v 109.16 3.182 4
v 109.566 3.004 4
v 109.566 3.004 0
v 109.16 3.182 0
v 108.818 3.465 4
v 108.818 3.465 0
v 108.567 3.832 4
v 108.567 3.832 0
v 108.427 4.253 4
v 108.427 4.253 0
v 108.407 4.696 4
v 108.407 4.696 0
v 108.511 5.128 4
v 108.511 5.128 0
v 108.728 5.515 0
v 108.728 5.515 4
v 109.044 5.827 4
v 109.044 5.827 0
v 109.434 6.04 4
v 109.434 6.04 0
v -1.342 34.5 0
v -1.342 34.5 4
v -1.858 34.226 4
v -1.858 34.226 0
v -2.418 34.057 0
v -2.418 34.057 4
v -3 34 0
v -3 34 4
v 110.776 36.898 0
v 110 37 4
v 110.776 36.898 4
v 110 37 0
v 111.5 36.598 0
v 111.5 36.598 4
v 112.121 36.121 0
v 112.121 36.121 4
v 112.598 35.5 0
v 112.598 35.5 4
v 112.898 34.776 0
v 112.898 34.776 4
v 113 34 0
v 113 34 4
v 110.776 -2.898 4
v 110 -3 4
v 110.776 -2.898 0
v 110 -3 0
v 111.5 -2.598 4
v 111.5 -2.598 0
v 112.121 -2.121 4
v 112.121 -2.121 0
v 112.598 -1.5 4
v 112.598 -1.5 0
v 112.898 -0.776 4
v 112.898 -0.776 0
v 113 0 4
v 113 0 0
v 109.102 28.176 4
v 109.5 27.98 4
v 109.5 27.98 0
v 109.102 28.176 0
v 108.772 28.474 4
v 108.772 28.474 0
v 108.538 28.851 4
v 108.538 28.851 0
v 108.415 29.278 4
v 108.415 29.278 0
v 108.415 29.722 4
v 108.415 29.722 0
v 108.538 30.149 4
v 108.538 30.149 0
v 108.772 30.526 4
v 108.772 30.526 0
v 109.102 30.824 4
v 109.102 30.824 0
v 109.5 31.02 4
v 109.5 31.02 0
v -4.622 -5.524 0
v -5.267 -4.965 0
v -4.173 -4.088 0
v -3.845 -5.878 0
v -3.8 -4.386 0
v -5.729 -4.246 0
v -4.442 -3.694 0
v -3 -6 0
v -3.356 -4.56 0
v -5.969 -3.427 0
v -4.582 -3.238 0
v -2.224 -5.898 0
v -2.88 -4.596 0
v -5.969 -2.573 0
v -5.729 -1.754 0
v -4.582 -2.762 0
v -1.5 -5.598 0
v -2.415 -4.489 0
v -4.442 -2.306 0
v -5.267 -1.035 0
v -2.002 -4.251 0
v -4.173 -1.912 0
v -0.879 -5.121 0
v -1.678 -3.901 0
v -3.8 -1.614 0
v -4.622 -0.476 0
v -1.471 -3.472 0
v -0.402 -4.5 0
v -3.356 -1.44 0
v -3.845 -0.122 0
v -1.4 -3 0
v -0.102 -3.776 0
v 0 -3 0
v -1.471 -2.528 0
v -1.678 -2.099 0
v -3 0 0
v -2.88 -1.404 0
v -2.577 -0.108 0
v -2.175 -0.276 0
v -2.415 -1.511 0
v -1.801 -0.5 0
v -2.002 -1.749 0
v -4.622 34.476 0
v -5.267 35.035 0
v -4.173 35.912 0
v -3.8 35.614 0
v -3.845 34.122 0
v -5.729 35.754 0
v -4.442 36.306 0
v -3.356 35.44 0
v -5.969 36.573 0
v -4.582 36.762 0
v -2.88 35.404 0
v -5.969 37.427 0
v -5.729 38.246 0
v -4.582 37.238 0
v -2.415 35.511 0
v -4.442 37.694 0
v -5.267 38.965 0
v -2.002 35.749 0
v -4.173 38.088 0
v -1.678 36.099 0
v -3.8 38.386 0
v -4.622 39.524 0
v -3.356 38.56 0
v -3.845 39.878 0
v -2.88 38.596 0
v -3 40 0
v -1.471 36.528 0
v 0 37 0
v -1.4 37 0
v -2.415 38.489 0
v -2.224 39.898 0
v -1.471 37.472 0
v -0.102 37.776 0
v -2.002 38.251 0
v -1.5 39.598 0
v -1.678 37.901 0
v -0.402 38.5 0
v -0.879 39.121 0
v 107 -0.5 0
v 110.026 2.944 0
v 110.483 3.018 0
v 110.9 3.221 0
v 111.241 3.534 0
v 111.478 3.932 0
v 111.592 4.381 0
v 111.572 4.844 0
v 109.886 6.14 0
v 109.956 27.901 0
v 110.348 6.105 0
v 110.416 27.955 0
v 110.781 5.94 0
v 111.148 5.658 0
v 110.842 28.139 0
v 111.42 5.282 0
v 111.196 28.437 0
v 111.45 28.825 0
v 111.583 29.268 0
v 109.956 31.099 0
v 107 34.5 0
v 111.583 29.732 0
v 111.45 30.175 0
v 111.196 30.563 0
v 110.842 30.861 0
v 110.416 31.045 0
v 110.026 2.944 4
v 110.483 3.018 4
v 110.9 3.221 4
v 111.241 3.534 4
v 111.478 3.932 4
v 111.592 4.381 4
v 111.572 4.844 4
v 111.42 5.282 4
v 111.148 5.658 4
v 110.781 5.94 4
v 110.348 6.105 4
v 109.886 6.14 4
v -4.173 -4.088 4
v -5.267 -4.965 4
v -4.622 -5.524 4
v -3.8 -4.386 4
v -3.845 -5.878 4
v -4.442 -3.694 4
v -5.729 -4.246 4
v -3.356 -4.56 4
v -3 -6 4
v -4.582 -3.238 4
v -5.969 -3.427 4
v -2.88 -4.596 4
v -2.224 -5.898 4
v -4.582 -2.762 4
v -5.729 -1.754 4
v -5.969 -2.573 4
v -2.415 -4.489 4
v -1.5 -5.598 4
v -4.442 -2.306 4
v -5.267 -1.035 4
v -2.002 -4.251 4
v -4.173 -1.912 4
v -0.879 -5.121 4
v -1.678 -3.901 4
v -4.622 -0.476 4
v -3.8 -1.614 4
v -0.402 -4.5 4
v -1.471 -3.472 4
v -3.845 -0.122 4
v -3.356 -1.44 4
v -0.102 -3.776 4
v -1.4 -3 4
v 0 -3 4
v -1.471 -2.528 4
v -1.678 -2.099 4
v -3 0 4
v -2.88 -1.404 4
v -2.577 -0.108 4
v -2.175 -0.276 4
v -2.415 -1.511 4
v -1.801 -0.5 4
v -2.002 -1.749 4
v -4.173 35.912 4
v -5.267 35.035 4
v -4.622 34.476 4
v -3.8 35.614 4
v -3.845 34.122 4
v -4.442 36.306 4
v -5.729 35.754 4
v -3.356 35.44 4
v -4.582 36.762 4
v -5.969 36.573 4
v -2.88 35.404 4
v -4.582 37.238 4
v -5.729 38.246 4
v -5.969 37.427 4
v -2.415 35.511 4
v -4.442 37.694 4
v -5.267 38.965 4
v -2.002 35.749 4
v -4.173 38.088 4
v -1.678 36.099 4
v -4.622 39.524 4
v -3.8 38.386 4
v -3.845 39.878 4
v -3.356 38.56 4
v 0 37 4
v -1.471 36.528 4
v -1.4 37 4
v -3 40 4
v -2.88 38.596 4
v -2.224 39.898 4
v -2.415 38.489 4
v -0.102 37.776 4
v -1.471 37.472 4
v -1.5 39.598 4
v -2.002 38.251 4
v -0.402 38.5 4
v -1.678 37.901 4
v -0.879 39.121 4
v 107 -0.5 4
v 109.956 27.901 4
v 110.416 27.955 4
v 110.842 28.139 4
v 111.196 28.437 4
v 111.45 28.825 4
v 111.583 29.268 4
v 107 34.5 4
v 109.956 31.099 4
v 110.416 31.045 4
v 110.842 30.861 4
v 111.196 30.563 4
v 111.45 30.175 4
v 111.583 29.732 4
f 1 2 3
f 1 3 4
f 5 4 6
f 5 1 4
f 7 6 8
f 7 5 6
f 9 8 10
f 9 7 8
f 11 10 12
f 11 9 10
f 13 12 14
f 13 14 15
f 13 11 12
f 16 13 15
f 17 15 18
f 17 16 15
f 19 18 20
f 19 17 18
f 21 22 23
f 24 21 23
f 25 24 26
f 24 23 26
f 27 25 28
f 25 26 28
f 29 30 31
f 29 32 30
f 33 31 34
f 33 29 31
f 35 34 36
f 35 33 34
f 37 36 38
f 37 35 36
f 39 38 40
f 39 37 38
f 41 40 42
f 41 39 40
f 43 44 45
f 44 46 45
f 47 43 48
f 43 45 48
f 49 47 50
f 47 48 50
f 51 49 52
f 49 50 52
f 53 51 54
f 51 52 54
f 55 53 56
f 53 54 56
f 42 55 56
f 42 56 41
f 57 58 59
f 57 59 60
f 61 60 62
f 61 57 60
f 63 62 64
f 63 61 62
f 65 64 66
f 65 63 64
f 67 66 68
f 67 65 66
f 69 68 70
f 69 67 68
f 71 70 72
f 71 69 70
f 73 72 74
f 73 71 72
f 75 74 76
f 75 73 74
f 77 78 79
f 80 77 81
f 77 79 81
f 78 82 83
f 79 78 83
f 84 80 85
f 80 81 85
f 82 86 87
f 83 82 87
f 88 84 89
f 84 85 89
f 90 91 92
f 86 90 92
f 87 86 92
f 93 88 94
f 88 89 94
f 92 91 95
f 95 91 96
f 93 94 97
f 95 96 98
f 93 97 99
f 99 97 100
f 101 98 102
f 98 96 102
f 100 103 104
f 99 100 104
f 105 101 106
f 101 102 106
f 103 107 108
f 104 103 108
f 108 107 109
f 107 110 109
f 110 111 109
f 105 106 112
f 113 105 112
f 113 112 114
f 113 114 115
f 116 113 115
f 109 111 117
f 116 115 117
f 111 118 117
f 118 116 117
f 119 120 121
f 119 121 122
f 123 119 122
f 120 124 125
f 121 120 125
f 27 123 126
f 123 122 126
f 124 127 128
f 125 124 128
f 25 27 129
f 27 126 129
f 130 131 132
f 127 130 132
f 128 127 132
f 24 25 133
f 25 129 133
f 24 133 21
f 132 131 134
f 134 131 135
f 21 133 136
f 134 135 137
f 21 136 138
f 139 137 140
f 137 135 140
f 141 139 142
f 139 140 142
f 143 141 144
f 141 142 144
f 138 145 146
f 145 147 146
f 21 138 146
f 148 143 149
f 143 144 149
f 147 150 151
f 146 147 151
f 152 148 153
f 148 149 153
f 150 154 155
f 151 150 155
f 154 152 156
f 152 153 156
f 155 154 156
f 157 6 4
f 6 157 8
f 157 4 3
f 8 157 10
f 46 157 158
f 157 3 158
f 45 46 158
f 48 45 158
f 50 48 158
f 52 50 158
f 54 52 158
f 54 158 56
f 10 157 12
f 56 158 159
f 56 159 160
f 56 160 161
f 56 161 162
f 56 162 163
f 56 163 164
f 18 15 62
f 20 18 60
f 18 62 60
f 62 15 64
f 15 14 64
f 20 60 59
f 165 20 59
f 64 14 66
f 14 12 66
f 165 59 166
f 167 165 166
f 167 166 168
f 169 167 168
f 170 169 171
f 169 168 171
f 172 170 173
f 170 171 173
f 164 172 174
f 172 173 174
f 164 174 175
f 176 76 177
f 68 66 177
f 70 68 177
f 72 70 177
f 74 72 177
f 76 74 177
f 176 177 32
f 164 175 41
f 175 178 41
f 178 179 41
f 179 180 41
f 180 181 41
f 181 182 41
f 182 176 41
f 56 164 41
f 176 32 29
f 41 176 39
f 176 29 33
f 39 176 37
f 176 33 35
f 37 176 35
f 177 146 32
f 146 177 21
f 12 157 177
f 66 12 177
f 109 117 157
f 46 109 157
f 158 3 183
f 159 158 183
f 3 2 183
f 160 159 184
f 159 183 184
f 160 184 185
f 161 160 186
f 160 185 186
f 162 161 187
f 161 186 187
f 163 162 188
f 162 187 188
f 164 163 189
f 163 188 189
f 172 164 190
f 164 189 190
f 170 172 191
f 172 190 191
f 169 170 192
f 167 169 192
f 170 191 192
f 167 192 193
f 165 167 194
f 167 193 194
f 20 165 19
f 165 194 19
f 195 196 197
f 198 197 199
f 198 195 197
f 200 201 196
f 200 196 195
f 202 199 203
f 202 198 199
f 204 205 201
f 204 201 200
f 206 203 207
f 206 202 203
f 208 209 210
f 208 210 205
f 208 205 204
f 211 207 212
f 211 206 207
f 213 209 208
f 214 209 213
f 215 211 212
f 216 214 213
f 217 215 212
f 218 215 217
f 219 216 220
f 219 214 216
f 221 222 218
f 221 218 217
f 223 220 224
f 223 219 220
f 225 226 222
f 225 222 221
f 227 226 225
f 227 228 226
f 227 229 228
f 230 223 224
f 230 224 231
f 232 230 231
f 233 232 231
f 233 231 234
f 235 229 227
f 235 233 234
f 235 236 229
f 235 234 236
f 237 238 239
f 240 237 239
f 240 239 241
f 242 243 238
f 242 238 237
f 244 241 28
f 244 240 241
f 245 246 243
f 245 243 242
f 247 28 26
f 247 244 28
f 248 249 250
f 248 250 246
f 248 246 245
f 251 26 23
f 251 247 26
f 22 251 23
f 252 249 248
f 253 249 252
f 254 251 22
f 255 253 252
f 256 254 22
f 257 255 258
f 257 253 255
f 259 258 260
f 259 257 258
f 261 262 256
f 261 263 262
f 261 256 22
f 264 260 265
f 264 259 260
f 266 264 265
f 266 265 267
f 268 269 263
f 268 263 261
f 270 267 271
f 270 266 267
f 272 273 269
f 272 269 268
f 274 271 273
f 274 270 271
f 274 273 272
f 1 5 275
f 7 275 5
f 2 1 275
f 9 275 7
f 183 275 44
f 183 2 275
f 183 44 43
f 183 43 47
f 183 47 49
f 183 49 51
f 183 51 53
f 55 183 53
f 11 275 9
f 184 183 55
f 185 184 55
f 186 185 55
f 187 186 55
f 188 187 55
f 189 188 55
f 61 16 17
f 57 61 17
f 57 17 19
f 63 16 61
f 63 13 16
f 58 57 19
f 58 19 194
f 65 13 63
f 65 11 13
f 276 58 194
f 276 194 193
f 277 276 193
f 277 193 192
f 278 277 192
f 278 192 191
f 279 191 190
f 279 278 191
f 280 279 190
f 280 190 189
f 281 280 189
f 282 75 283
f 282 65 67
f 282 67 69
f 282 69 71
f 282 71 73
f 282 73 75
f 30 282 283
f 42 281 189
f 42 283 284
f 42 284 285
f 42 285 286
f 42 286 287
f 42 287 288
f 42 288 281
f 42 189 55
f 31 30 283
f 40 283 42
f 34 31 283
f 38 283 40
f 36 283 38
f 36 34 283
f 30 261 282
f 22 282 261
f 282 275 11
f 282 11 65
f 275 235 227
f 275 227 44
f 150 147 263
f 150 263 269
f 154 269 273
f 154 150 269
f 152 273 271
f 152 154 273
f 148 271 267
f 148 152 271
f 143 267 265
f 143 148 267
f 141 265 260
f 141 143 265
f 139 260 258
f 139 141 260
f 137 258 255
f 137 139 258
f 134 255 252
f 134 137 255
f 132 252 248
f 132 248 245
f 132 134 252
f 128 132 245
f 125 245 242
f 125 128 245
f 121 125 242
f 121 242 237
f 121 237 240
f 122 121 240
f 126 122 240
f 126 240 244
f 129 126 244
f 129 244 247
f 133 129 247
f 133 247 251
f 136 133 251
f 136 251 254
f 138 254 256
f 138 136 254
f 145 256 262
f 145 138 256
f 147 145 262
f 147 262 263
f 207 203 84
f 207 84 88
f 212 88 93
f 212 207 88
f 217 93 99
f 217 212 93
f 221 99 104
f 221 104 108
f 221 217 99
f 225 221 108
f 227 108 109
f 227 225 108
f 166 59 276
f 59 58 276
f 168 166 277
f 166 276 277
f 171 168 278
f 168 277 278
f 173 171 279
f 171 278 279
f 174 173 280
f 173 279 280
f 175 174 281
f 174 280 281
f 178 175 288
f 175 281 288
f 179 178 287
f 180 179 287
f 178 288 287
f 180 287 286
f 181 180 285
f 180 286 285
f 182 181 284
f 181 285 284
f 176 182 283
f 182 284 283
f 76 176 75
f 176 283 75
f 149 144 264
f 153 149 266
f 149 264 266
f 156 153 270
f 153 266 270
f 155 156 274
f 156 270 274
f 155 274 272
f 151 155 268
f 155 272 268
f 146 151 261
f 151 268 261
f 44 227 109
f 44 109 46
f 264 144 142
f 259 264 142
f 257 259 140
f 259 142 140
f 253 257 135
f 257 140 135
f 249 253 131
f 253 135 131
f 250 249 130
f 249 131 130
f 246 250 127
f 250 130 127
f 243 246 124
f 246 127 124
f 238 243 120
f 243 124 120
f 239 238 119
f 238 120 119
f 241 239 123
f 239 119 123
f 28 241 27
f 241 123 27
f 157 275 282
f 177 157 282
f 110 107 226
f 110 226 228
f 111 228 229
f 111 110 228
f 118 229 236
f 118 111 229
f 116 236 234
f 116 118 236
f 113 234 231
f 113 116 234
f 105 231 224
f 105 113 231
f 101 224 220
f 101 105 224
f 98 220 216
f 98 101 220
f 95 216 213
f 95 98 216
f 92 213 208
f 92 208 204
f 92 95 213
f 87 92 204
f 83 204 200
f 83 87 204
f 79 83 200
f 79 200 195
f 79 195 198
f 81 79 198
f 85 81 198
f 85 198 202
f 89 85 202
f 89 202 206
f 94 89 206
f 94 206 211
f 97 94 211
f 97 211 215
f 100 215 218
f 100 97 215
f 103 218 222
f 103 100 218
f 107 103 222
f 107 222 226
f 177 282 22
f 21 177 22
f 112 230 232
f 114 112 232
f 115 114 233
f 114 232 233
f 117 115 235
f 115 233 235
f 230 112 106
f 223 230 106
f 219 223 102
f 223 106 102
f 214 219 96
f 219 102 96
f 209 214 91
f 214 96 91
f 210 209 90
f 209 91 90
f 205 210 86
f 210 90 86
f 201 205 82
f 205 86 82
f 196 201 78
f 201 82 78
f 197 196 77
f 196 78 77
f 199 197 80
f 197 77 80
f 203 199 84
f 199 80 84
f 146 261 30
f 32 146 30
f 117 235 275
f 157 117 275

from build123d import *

# Parameters (mm, degrees)
SKETCH1_R           = 1.6
BOSS_EXTRUDE1_DEPTH = 4
SKETCH2_R           = 1.6
BOSS_EXTRUDE2_DEPTH = 4
SKETCH3_R           = 1.6
CUT_EXTRUDE1_DEPTH  = 4
SKETCH4_W           = 1
SKETCH4_H           = 46
BOSS_EXTRUDE4_DEPTH = 4
SKETCH6_R           = 1.6
SKETCH6_W           = 1
SKETCH6_H           = 34
CUT_EXTRUDE2_DEPTH  = 4
CUT_EXTRUDE4_DEPTH  = 4
FILLET2_R           = 3
CUT_EXTRUDE5_DEPTH  = 10
FILLET3_R           = 3


with BuildPart() as part:
    # Sketch1 → Boss-Extrude1 (new body)
    with BuildSketch(Plane.XY):
        with BuildLine():
            Line((0, 34), (106, 34))
            Line((106, 34), (106, 0))
            Line((106, 0), (0, 0))
            Line((0, 0), (-3, 0))
            ThreePointArc((-3, 0), (-6, -3), (-3, -6))
            Line((-3, -6), (112, -6))
            Line((112, -6), (112, 0))
            Line((112, 0), (112, 40))
            Line((112, 40), (-3, 40))
            ThreePointArc((-3, 40), (-6, 37), (-3, 34))
            Line((-3, 34), (0, 34))
        make_face()
        with Locations((-3, 37)):
            Circle(SKETCH1_R, mode=Mode.SUBTRACT)
        with Locations((-3, -3)):
            Circle(SKETCH1_R, mode=Mode.SUBTRACT)
        with Locations((109, 29.25)):
            Circle(SKETCH1_R, mode=Mode.SUBTRACT)
        with Locations((109, 4.75)):
            Circle(SKETCH1_R, mode=Mode.SUBTRACT)
    extrude(amount=BOSS_EXTRUDE1_DEPTH)

    # Sketch2 → Boss-Extrude2 (add)
    with BuildSketch(Plane.XY.offset(4)):
        with Locations((109, 4.75)):
            Circle(SKETCH2_R)
        with Locations((109, 29.25)):
            Circle(SKETCH2_R)
    extrude(amount=-BOSS_EXTRUDE2_DEPTH)

    # Sketch3 → Cut-Extrude1 (cut)
    with BuildSketch(Plane.XY.offset(4)):
        with Locations((109, 29.5)):
            Circle(SKETCH3_R)
        with Locations((109, 4.5)):
            Circle(SKETCH3_R)
    extrude(amount=-CUT_EXTRUDE1_DEPTH, mode=Mode.SUBTRACT)

    # Sketch4 → Boss-Extrude4 (add)
    with BuildSketch(Plane.XY.offset(4)):
        with Locations((112.5, 17)):
            Rectangle(SKETCH4_W, SKETCH4_H)
        with BuildLine():
            ThreePointArc((109.5, 27.980131585), (108.4, 29.5), (109.5, 31.019868415))
            ThreePointArc((109.5, 31.019868415), (107.4, 29.5), (109.5, 27.980131585))
        make_face()
        with BuildLine():
            ThreePointArc((109.566346567, 3.003587101), (108.401525498, 4.473847256), (109.433653433, 6.040111912))
            ThreePointArc((109.433653433, 6.040111912), (107.401525498, 4.430148243), (109.566346567, 3.003587101))
        make_face()
    extrude(amount=-BOSS_EXTRUDE4_DEPTH)

    # Sketch6 → Cut-Extrude2 (cut)
    with BuildSketch(Plane.XY.offset(4)):
        with Locations((110, 4.543699012)):
            Circle(SKETCH6_R)
        with Locations((110, 29.5)):
            Circle(SKETCH6_R)
        with Locations((106.5, 17)):
            Rectangle(SKETCH6_W, SKETCH6_H)
    extrude(amount=-CUT_EXTRUDE2_DEPTH, mode=Mode.SUBTRACT)

    # Sketch7 → Cut-Extrude4 (cut)
    with BuildSketch(Plane.XY.offset(4)):
        with BuildLine():
            Line((52, 0), (-3, 0))
            ThreePointArc((-3, 0), (-2.373132959, -0.184325643), (-1.801042119, -0.5))
            Line((-1.801042119, -0.5), (52, -0.5))
            Line((52, -0.5), (107, -0.5))
            Line((107, -0.5), (107, 0))
            Line((107, 0), (52, 0))
        make_face()
        with BuildLine():
            Line((52, 34.5), (-1.341687605, 34.5))
            ThreePointArc((-1.341687605, 34.5), (-2.133974596, 34.127718677), (-3, 34))
            Line((-3, 34), (52, 34))
            Line((52, 34), (107, 34))
            Line((107, 34), (107, 34.5))
            Line((107, 34.5), (52, 34.5))
        make_face()
    extrude(amount=-CUT_EXTRUDE4_DEPTH, mode=Mode.SUBTRACT)

    # Fillet2
    fillet2_edges = [part.edges().sort_by_distance(p)[0] for p in [
        (113, -6, 2),
        (113, 40, 2),
    ]]
    fillet(fillet2_edges, radius=FILLET2_R)

    # Sketch8 → Cut-Extrude5 (cut)
    with BuildSketch(Plane.XY.offset(4)):
        with BuildLine():
            Line((0, 37), (113, 37))
            Line((113, 37), (119.400968333, 46.55128084))
            Line((119.400968333, 46.55128084), (-5.470878247, 48.639937772))
            Line((-5.470878247, 48.639937772), (-3, 40))
            ThreePointArc((-3, 40), (-0.878679656, 39.121320344), (0, 37))
        make_face()
        with BuildLine():
            Line((0, -3), (113, -3))
            Line((113, -3), (122.38476395, -22.523587699))
            Line((122.38476395, -22.523587699), (1.093472111, -19.390602301))
            Line((1.093472111, -19.390602301), (-3, -6))
            ThreePointArc((-3, -6), (-0.878679656, -5.121320344), (0, -3))
        make_face()
    extrude(amount=-CUT_EXTRUDE5_DEPTH, mode=Mode.SUBTRACT)

    # Fillet3
    fillet3_edges = [part.edges().sort_by_distance(p)[0] for p in [
        (113, -3, 2),
        (113, 37, 2),
    ]]
    fillet(fillet3_edges, radius=FILLET3_R)


solid = part.part
